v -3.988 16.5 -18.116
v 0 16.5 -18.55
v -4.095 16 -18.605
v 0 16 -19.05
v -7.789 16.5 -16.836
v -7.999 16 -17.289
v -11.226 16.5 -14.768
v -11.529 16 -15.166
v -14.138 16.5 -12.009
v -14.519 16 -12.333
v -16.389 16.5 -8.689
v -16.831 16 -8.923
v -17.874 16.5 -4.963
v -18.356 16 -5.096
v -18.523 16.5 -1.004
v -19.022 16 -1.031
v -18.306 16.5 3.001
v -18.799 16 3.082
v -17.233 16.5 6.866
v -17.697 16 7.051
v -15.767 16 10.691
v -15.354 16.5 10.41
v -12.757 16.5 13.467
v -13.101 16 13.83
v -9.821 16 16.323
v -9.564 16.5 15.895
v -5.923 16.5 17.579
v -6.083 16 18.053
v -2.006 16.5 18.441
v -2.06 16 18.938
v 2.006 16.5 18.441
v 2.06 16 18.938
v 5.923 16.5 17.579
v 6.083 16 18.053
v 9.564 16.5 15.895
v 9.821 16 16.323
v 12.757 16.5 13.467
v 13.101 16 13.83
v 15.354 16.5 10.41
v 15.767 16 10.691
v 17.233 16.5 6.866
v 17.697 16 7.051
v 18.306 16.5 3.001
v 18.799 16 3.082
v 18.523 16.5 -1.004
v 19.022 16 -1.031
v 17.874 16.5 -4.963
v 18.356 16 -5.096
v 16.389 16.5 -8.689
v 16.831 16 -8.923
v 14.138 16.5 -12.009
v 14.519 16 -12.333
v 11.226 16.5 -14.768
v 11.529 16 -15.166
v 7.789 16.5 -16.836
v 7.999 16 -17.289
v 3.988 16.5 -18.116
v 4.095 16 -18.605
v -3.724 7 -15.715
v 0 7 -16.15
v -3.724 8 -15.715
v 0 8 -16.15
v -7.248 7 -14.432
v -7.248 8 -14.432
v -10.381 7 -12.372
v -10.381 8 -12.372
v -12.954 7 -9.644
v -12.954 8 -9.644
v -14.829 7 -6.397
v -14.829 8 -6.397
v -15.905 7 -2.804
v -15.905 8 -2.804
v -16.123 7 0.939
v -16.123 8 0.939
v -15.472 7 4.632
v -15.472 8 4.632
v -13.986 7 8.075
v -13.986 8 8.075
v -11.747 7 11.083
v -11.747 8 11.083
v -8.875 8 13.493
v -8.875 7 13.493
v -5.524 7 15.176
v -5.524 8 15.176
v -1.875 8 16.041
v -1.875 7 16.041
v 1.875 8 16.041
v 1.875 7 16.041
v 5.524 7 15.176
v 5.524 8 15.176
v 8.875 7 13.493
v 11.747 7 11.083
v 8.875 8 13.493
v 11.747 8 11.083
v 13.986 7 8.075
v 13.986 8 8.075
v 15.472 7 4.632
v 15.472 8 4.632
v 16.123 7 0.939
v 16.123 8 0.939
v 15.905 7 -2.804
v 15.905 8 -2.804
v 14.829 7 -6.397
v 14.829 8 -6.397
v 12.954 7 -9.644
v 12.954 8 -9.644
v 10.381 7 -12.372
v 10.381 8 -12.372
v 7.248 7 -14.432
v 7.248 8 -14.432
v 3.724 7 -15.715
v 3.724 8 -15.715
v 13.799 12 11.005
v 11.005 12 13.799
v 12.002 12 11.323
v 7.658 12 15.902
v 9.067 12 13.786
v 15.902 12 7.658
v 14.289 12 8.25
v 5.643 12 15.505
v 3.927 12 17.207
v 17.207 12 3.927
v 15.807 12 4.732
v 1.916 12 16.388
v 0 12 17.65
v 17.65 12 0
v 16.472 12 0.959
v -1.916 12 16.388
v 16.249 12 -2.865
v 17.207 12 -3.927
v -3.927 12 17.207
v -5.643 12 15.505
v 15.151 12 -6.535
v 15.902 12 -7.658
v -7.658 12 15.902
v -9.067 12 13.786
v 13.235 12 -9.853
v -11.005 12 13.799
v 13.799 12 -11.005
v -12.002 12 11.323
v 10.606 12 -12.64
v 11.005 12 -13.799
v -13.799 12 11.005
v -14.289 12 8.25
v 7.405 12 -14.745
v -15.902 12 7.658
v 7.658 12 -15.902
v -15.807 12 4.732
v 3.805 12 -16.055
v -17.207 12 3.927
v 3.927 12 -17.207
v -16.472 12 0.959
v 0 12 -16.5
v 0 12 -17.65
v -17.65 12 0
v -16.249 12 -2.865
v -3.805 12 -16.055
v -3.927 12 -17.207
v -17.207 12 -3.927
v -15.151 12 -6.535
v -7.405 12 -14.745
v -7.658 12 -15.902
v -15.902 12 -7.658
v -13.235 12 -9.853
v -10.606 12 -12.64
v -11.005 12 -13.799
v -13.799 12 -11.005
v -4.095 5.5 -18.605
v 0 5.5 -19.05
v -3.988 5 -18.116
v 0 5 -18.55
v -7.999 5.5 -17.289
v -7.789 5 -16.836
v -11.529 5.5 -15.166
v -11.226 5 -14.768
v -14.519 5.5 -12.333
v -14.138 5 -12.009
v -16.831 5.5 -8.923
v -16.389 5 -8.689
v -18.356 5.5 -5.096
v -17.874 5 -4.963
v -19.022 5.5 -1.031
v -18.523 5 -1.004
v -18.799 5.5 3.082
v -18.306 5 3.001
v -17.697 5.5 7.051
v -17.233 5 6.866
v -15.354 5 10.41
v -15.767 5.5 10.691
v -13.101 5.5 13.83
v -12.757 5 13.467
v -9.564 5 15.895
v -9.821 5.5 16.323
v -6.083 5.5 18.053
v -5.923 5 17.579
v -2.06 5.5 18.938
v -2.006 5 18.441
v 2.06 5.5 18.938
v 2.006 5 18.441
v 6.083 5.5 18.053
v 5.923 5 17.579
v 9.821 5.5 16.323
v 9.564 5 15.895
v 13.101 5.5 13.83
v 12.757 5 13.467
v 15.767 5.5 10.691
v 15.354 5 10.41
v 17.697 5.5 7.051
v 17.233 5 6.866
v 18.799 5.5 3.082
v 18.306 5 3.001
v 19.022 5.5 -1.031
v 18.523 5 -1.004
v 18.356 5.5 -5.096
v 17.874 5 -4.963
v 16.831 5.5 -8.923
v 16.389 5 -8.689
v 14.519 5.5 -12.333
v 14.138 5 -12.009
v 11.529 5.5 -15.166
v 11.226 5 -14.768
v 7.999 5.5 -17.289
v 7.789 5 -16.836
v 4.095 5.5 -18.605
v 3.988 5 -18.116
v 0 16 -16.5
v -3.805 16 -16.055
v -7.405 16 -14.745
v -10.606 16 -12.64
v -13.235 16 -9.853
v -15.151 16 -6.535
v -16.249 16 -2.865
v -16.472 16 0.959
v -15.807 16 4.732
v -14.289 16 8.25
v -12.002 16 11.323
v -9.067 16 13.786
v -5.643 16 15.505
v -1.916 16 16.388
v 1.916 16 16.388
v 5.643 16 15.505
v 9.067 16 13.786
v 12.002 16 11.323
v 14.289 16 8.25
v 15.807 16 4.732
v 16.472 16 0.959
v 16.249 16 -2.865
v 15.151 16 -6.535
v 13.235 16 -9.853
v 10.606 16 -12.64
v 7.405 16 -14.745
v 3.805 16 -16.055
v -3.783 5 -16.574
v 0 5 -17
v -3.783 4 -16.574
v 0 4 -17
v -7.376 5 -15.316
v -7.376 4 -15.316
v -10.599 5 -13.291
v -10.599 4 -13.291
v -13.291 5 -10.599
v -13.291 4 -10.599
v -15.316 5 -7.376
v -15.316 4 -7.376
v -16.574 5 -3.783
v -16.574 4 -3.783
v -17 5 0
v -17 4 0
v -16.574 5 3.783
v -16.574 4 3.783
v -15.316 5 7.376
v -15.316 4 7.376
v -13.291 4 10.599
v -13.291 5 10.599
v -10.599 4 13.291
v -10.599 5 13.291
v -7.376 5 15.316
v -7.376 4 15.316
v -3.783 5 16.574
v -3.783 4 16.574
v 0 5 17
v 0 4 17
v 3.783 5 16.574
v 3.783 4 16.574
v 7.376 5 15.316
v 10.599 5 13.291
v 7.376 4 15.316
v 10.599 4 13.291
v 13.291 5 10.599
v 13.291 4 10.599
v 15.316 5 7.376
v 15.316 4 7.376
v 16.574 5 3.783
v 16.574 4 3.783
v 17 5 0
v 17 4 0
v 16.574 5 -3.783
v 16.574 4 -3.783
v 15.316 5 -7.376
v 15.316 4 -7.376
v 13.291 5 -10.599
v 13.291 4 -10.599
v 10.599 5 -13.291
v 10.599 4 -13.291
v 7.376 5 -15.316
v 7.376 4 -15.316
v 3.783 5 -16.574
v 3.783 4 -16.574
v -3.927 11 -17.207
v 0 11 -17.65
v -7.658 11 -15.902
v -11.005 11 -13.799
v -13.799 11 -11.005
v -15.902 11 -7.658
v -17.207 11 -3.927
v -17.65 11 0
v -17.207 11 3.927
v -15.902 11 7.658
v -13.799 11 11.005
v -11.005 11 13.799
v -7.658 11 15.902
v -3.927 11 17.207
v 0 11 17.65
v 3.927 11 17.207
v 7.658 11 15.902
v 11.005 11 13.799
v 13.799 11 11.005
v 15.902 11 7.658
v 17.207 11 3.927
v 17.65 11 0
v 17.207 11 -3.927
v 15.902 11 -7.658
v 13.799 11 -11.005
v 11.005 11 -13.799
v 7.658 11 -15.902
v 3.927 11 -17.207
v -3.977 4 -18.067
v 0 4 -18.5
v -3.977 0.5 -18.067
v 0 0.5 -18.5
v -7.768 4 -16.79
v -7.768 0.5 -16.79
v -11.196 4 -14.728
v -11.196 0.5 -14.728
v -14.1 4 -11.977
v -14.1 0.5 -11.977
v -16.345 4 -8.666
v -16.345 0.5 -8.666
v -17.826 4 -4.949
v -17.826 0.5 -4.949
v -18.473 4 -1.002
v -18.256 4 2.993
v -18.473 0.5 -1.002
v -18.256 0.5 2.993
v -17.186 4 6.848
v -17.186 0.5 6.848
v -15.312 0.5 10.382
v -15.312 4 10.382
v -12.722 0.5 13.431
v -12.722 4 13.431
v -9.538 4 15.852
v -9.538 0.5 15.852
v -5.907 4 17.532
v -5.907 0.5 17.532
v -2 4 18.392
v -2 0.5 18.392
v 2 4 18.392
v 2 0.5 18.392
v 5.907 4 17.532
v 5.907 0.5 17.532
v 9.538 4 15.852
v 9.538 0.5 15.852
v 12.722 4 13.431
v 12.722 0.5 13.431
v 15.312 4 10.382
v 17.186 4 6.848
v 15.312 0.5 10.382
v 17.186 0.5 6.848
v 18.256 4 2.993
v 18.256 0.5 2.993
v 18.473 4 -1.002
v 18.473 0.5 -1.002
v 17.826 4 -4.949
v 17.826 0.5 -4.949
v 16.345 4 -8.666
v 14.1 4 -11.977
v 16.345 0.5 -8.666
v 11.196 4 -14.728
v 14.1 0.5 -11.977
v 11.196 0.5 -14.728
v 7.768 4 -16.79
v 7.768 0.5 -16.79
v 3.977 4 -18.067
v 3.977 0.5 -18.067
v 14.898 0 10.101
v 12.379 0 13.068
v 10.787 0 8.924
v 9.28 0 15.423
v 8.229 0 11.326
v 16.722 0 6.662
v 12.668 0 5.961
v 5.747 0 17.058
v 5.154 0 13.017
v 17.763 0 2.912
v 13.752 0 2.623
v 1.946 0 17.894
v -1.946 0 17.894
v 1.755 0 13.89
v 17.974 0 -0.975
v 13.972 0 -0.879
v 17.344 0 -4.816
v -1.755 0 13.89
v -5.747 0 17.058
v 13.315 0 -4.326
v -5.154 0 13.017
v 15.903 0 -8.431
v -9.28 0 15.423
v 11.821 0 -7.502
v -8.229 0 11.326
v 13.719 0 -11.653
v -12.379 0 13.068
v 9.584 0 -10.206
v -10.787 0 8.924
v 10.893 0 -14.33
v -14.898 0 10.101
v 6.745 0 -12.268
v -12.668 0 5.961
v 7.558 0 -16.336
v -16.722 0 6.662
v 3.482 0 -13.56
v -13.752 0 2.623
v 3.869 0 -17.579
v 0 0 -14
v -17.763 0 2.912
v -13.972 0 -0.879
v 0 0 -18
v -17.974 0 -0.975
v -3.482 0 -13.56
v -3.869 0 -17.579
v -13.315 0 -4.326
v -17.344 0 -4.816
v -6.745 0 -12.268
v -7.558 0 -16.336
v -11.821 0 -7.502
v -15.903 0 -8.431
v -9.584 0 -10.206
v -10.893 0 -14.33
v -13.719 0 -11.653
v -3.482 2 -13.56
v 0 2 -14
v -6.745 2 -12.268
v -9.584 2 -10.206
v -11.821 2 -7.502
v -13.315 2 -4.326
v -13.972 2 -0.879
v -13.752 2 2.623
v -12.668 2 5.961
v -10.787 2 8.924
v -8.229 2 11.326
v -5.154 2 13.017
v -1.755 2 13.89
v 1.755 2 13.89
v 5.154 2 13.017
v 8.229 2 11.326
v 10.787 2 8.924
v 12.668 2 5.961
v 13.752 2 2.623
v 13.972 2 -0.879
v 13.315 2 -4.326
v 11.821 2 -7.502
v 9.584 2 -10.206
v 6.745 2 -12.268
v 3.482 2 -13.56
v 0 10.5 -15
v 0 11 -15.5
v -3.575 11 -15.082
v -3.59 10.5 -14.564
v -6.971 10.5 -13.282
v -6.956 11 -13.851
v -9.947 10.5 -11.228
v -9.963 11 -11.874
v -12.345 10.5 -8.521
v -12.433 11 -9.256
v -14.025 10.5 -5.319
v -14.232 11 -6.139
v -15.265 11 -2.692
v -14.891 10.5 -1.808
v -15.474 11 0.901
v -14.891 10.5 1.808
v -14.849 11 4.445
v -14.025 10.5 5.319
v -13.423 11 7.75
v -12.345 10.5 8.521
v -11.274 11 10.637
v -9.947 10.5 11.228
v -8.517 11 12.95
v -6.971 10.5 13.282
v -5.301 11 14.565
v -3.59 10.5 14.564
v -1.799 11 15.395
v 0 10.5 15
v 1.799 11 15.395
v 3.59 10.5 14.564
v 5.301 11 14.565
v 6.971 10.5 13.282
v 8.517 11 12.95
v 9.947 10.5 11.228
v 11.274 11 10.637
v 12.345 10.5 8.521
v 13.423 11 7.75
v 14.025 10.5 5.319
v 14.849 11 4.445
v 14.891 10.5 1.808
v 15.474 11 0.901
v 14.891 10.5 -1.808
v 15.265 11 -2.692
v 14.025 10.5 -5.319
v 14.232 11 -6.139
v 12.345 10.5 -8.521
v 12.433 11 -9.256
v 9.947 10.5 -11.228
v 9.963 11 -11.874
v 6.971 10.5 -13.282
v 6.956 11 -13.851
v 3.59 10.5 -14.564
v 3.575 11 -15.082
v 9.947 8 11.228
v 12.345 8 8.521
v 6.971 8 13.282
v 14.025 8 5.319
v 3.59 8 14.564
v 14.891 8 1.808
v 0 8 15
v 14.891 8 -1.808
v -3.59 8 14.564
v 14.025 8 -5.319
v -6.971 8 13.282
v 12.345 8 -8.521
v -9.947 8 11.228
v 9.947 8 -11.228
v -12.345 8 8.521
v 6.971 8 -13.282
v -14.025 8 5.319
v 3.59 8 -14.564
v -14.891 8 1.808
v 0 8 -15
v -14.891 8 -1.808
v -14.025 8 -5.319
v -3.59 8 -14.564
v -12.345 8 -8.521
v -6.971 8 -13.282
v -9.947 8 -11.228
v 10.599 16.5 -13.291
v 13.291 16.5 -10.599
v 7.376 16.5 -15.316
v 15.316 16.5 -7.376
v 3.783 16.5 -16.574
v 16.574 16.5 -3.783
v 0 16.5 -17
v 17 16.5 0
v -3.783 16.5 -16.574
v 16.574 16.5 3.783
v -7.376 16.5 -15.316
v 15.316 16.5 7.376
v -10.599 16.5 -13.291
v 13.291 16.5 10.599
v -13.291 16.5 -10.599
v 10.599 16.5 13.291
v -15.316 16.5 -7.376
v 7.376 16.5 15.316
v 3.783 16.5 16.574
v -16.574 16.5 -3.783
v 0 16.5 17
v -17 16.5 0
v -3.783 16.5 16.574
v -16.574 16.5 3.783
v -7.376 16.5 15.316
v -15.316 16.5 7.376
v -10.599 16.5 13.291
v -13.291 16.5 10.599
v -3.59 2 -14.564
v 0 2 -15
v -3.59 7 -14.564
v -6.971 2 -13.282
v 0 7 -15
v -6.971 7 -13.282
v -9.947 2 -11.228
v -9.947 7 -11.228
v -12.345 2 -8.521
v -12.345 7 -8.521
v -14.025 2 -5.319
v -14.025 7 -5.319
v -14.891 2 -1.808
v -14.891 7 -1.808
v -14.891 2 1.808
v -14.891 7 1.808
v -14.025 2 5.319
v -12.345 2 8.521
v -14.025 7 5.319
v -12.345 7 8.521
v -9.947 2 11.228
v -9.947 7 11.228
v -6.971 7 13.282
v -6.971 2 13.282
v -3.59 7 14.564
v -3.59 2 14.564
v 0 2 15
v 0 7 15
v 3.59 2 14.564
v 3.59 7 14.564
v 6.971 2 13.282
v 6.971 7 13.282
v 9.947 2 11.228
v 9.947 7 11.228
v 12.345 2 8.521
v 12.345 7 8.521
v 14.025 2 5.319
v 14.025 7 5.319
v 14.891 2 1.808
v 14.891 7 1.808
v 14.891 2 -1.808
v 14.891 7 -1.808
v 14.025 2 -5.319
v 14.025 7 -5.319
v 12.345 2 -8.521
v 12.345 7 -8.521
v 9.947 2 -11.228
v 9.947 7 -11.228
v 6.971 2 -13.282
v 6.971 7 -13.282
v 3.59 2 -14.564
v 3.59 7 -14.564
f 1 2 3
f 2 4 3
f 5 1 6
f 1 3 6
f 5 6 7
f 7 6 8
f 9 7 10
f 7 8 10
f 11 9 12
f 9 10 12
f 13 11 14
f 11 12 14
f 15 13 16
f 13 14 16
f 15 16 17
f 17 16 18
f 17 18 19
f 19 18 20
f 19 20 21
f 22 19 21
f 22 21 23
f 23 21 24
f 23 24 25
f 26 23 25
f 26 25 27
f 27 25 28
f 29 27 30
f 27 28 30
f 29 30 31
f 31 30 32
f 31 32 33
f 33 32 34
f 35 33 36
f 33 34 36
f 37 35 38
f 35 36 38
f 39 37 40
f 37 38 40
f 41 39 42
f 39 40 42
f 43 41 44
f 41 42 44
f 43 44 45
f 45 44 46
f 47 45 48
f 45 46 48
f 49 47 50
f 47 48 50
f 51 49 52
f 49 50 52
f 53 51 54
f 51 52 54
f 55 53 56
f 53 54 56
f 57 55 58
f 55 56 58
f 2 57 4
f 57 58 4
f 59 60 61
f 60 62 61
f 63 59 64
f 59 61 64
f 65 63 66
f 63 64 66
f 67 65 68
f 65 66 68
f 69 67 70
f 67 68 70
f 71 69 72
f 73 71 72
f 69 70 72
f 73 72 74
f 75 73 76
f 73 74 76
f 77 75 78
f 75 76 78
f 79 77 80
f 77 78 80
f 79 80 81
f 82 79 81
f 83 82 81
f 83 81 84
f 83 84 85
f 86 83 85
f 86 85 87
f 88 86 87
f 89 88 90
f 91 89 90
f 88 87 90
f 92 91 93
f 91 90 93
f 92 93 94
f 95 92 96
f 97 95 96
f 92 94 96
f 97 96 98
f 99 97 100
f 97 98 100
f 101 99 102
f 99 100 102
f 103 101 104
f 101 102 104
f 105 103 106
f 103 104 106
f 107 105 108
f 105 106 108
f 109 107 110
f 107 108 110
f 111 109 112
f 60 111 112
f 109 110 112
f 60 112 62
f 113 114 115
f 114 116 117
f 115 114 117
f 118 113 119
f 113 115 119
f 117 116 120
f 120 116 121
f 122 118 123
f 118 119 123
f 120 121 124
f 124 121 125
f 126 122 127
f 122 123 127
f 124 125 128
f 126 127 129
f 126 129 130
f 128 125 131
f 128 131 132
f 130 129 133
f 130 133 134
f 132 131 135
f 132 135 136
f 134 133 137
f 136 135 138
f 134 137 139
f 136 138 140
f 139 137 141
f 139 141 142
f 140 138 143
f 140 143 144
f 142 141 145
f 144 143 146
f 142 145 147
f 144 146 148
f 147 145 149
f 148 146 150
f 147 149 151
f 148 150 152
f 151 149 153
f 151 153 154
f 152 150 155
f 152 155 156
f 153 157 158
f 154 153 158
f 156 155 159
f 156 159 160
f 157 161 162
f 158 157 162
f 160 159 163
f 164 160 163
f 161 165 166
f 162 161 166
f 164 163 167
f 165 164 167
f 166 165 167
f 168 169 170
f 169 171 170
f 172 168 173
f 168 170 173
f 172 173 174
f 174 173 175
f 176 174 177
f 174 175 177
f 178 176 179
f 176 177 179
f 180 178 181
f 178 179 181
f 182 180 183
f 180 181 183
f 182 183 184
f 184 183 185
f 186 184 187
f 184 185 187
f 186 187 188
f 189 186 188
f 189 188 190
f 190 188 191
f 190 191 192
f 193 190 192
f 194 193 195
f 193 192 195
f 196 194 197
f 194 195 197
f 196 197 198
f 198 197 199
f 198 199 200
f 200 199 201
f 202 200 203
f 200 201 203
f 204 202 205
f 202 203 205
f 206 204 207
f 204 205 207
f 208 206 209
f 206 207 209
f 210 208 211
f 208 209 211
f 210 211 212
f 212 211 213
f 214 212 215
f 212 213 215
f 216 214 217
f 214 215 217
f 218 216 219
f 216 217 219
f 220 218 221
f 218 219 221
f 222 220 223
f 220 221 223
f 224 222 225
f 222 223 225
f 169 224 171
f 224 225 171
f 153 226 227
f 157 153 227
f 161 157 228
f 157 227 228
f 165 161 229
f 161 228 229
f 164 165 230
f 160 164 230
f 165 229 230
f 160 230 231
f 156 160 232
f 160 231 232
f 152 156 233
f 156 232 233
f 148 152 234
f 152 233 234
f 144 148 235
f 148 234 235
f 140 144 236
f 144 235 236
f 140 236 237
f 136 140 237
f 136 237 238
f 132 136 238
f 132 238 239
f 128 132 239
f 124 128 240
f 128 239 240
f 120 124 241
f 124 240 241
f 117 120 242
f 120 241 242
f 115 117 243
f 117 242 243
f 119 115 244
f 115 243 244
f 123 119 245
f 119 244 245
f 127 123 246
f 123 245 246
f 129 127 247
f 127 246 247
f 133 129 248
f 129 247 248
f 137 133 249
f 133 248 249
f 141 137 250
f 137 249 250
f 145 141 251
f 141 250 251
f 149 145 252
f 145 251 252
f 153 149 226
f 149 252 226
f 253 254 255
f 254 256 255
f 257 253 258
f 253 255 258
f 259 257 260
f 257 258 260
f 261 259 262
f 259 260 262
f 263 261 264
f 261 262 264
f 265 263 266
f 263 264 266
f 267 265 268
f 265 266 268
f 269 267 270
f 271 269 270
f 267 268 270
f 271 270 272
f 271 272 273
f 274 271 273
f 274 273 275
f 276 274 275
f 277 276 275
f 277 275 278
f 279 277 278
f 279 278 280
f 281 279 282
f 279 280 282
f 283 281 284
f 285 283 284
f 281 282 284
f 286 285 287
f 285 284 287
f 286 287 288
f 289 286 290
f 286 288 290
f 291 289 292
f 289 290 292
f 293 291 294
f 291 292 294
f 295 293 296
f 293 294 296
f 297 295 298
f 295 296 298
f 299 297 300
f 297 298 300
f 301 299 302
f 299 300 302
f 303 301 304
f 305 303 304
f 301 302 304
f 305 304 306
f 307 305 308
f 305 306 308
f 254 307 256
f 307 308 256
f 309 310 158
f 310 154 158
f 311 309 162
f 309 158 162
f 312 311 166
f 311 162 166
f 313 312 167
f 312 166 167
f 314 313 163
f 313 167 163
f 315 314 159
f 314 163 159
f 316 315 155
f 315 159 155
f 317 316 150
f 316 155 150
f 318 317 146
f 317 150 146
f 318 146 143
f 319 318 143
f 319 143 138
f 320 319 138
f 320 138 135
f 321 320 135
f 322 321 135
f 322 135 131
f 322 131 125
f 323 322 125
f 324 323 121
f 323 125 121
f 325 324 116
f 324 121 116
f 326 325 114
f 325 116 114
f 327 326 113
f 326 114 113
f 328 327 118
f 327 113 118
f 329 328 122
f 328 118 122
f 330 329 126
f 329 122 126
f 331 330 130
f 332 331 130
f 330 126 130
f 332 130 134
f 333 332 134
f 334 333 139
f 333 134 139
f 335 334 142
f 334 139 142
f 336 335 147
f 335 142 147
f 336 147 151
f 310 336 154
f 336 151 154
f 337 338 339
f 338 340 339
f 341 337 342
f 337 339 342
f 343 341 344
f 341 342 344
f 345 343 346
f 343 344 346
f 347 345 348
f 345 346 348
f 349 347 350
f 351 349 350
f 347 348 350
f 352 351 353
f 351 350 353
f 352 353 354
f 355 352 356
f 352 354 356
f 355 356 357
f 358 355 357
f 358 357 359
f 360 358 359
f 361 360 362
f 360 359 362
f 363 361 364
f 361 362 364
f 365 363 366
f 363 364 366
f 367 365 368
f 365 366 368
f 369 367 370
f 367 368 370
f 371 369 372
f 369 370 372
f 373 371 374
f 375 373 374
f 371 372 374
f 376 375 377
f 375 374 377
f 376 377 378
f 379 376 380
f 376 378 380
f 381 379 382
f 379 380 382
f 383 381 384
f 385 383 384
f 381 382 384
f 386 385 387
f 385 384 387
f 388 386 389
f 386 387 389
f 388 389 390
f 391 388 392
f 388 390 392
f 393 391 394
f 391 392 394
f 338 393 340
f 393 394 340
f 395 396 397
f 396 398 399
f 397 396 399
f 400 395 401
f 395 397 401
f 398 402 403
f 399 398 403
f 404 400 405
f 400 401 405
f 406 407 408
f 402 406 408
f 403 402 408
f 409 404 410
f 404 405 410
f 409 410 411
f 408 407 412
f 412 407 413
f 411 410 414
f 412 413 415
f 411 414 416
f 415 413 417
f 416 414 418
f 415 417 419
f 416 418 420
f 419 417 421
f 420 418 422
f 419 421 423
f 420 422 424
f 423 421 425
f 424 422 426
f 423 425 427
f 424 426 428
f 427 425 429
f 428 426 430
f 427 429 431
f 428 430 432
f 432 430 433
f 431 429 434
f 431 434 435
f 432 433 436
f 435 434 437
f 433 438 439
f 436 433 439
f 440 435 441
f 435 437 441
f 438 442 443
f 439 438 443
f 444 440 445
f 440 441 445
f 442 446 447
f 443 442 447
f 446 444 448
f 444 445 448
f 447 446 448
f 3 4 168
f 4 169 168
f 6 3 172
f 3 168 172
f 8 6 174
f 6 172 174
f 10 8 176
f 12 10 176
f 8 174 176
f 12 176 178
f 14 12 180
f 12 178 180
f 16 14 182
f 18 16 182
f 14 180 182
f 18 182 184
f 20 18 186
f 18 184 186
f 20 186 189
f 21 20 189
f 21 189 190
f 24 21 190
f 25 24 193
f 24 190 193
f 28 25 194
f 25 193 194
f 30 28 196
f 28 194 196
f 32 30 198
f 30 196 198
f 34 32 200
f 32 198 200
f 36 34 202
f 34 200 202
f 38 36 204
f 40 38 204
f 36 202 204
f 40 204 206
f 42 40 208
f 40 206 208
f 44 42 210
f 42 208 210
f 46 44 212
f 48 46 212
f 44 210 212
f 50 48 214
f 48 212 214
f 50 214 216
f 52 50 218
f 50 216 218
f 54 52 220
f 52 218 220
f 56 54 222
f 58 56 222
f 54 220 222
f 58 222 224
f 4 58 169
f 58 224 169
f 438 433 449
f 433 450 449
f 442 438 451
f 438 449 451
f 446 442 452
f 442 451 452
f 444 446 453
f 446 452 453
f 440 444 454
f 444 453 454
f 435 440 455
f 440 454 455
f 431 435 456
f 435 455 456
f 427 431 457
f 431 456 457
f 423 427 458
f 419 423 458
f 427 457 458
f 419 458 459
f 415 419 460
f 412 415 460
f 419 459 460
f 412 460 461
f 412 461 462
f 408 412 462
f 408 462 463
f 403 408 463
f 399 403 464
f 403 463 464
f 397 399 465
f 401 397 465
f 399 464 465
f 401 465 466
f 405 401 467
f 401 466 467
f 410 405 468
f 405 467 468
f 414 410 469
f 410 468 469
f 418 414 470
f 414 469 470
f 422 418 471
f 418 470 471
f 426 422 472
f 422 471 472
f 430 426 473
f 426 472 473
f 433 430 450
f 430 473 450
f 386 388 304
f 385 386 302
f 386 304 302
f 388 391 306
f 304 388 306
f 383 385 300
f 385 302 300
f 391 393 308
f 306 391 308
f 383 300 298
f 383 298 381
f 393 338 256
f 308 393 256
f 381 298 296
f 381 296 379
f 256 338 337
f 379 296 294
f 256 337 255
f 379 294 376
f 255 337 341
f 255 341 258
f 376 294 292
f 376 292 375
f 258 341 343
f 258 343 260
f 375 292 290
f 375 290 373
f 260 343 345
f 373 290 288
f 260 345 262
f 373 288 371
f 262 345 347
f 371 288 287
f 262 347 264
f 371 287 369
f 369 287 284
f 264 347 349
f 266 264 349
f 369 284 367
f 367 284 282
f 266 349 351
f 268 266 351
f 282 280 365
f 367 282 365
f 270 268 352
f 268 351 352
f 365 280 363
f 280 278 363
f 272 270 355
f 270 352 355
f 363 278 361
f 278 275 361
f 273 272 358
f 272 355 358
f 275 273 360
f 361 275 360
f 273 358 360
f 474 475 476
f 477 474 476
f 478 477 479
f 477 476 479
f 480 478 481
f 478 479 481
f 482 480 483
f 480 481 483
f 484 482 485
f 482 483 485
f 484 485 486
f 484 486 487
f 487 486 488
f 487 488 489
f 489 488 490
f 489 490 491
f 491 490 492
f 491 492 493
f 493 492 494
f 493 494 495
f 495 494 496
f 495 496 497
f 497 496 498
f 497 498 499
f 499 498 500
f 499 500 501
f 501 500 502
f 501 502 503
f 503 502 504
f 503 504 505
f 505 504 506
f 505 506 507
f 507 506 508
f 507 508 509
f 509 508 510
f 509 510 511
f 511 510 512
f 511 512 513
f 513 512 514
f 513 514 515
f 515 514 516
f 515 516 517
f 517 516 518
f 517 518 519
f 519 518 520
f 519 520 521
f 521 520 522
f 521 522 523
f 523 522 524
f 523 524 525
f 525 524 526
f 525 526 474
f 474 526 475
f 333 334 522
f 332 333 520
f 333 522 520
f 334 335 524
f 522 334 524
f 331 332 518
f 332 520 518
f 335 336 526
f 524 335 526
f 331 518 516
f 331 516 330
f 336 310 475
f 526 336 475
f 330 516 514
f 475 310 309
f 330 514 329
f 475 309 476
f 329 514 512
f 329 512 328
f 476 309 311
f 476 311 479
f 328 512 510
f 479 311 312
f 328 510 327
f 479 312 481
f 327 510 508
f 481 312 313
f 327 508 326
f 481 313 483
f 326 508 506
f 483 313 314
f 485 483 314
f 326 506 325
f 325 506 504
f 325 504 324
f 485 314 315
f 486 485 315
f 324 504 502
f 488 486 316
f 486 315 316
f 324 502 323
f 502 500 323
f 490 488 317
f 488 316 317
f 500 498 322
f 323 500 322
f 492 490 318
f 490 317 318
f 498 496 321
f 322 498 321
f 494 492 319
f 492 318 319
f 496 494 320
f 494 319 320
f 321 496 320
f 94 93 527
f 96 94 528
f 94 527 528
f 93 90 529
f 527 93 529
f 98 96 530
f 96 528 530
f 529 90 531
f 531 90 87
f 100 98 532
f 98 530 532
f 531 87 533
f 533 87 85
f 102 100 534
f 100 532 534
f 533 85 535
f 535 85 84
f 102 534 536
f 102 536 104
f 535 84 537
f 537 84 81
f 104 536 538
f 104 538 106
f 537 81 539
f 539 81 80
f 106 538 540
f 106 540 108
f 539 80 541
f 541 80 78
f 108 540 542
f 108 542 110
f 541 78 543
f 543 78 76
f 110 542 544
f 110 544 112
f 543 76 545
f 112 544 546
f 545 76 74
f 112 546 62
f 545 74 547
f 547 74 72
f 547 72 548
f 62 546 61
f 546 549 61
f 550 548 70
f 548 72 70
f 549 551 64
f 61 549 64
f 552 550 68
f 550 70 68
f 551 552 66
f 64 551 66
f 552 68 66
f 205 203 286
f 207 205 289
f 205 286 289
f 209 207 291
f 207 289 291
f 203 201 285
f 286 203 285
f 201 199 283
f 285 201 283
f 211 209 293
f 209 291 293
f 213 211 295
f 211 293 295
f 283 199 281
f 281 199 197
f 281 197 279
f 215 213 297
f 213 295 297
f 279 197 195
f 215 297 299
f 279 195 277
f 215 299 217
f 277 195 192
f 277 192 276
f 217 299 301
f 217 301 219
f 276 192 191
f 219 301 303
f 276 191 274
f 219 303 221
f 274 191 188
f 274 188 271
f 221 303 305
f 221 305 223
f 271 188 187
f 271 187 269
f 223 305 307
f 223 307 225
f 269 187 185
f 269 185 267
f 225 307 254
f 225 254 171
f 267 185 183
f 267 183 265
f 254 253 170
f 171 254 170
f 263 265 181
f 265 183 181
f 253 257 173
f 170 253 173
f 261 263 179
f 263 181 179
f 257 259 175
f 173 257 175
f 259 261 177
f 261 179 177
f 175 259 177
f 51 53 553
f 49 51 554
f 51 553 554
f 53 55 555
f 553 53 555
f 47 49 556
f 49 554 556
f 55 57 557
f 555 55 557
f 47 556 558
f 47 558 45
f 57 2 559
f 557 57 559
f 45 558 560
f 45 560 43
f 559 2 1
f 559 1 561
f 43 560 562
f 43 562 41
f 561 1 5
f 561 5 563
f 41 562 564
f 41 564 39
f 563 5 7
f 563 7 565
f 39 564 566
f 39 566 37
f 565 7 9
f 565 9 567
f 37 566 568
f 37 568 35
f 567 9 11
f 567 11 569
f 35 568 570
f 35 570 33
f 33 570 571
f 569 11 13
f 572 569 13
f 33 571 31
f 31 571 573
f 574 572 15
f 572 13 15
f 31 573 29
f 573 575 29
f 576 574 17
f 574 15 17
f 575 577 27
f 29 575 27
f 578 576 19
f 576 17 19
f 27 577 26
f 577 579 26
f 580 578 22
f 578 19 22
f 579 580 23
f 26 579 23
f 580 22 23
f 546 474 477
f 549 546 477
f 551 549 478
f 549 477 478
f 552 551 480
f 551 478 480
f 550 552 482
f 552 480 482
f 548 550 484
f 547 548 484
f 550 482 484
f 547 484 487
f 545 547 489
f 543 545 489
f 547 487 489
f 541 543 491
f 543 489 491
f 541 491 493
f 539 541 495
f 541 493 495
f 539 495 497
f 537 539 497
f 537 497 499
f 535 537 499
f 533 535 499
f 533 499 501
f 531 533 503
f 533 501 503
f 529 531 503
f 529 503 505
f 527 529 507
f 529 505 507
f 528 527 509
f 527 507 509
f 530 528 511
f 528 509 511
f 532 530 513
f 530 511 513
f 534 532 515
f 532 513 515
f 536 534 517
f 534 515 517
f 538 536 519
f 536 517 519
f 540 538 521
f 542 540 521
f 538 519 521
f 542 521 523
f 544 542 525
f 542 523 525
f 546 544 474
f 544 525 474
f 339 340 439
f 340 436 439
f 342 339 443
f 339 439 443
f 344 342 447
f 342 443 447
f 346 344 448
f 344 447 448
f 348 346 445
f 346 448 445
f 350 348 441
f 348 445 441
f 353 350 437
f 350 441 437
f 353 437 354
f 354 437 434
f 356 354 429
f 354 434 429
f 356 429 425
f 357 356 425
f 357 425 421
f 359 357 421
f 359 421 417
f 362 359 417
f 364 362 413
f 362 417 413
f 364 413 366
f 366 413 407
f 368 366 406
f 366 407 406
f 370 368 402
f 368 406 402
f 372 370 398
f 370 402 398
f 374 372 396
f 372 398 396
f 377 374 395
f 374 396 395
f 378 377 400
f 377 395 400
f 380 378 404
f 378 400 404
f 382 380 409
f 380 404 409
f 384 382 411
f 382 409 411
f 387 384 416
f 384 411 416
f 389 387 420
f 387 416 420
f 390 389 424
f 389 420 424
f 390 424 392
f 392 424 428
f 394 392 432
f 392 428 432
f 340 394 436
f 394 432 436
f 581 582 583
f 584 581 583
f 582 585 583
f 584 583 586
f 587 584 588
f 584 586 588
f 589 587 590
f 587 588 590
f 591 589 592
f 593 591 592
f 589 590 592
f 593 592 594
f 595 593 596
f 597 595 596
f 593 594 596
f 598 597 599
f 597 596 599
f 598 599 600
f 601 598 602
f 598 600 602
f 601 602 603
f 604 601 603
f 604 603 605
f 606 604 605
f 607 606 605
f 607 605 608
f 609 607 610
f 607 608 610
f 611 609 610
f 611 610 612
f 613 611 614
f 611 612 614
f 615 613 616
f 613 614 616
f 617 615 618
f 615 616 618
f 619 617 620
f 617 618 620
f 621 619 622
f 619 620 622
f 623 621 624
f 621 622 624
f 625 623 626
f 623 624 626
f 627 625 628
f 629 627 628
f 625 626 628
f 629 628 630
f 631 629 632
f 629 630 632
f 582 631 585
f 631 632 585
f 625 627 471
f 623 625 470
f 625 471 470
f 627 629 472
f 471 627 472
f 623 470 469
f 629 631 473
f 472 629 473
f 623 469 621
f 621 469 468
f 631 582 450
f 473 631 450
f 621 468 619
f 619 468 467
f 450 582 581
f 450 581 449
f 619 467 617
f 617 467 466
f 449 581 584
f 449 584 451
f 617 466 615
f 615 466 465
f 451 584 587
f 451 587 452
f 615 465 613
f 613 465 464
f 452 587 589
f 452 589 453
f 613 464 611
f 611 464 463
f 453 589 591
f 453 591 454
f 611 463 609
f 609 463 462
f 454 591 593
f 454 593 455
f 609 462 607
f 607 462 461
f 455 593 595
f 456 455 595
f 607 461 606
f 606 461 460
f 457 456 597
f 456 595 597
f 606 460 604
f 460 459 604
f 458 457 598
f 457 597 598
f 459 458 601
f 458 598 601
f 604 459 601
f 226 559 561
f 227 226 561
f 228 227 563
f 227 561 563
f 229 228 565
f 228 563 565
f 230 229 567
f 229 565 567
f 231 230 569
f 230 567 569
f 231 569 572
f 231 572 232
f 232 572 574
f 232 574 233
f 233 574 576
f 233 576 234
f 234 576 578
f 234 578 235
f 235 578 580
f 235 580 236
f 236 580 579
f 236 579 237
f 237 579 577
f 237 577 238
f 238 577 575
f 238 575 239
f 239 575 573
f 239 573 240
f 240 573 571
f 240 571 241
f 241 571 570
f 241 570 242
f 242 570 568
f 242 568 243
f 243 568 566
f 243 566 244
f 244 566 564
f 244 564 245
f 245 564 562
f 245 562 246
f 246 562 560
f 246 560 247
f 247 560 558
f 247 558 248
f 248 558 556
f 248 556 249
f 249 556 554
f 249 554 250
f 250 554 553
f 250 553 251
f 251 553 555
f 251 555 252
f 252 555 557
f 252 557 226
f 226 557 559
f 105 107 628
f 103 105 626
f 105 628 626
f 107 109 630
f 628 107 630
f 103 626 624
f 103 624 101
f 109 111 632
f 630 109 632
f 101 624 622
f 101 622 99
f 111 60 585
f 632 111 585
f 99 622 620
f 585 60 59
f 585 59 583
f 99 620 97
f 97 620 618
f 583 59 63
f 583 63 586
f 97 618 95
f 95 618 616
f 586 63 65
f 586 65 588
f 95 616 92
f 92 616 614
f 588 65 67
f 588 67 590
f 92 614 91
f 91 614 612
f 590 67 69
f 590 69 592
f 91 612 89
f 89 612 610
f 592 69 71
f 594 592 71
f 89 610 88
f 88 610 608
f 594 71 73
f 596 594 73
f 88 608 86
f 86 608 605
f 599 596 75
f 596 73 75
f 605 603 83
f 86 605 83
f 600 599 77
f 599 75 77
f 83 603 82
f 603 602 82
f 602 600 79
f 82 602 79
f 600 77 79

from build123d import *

# Parameters (mm, degrees)
CHAMFER_1_SIZE = 0.5


with BuildPart() as part:
    # 草图1 → 旋转1 (revolve)
    with BuildSketch(Plane.XY, mode=Mode.PRIVATE) as revolve_1_sk:
        Polygon((14, 0), (14, 2), (15, 2), (15, 7), (16.15, 7), (16.15, 8), (15, 8), (15, 11), (17.65, 11), (17.65, 12), (16.5, 12), (16.5, 16.5), (18.55, 16.5), (19.05, 16), (19.05, 5.5), (18.55, 5), (17, 5), (17, 4), (18.5, 4), (18.5, 0.5), (18, 0), align=None)
    revolve(revolve_1_sk.sketch.rotate(Axis((0, 0, 0), (0, 1, 0)), 90), axis=Axis((0, 0, 0), (0, 1, 0)))  # turned: the seam where the file's is

    # 倒角1
    chamfer_1_edges = [part.edges().sort_by_distance(p)[0] for p in [
        (0, 11, 15),
        (0, 16.5, 16.5),
    ]]
    chamfer(chamfer_1_edges, length=CHAMFER_1_SIZE)


solid = part.part
